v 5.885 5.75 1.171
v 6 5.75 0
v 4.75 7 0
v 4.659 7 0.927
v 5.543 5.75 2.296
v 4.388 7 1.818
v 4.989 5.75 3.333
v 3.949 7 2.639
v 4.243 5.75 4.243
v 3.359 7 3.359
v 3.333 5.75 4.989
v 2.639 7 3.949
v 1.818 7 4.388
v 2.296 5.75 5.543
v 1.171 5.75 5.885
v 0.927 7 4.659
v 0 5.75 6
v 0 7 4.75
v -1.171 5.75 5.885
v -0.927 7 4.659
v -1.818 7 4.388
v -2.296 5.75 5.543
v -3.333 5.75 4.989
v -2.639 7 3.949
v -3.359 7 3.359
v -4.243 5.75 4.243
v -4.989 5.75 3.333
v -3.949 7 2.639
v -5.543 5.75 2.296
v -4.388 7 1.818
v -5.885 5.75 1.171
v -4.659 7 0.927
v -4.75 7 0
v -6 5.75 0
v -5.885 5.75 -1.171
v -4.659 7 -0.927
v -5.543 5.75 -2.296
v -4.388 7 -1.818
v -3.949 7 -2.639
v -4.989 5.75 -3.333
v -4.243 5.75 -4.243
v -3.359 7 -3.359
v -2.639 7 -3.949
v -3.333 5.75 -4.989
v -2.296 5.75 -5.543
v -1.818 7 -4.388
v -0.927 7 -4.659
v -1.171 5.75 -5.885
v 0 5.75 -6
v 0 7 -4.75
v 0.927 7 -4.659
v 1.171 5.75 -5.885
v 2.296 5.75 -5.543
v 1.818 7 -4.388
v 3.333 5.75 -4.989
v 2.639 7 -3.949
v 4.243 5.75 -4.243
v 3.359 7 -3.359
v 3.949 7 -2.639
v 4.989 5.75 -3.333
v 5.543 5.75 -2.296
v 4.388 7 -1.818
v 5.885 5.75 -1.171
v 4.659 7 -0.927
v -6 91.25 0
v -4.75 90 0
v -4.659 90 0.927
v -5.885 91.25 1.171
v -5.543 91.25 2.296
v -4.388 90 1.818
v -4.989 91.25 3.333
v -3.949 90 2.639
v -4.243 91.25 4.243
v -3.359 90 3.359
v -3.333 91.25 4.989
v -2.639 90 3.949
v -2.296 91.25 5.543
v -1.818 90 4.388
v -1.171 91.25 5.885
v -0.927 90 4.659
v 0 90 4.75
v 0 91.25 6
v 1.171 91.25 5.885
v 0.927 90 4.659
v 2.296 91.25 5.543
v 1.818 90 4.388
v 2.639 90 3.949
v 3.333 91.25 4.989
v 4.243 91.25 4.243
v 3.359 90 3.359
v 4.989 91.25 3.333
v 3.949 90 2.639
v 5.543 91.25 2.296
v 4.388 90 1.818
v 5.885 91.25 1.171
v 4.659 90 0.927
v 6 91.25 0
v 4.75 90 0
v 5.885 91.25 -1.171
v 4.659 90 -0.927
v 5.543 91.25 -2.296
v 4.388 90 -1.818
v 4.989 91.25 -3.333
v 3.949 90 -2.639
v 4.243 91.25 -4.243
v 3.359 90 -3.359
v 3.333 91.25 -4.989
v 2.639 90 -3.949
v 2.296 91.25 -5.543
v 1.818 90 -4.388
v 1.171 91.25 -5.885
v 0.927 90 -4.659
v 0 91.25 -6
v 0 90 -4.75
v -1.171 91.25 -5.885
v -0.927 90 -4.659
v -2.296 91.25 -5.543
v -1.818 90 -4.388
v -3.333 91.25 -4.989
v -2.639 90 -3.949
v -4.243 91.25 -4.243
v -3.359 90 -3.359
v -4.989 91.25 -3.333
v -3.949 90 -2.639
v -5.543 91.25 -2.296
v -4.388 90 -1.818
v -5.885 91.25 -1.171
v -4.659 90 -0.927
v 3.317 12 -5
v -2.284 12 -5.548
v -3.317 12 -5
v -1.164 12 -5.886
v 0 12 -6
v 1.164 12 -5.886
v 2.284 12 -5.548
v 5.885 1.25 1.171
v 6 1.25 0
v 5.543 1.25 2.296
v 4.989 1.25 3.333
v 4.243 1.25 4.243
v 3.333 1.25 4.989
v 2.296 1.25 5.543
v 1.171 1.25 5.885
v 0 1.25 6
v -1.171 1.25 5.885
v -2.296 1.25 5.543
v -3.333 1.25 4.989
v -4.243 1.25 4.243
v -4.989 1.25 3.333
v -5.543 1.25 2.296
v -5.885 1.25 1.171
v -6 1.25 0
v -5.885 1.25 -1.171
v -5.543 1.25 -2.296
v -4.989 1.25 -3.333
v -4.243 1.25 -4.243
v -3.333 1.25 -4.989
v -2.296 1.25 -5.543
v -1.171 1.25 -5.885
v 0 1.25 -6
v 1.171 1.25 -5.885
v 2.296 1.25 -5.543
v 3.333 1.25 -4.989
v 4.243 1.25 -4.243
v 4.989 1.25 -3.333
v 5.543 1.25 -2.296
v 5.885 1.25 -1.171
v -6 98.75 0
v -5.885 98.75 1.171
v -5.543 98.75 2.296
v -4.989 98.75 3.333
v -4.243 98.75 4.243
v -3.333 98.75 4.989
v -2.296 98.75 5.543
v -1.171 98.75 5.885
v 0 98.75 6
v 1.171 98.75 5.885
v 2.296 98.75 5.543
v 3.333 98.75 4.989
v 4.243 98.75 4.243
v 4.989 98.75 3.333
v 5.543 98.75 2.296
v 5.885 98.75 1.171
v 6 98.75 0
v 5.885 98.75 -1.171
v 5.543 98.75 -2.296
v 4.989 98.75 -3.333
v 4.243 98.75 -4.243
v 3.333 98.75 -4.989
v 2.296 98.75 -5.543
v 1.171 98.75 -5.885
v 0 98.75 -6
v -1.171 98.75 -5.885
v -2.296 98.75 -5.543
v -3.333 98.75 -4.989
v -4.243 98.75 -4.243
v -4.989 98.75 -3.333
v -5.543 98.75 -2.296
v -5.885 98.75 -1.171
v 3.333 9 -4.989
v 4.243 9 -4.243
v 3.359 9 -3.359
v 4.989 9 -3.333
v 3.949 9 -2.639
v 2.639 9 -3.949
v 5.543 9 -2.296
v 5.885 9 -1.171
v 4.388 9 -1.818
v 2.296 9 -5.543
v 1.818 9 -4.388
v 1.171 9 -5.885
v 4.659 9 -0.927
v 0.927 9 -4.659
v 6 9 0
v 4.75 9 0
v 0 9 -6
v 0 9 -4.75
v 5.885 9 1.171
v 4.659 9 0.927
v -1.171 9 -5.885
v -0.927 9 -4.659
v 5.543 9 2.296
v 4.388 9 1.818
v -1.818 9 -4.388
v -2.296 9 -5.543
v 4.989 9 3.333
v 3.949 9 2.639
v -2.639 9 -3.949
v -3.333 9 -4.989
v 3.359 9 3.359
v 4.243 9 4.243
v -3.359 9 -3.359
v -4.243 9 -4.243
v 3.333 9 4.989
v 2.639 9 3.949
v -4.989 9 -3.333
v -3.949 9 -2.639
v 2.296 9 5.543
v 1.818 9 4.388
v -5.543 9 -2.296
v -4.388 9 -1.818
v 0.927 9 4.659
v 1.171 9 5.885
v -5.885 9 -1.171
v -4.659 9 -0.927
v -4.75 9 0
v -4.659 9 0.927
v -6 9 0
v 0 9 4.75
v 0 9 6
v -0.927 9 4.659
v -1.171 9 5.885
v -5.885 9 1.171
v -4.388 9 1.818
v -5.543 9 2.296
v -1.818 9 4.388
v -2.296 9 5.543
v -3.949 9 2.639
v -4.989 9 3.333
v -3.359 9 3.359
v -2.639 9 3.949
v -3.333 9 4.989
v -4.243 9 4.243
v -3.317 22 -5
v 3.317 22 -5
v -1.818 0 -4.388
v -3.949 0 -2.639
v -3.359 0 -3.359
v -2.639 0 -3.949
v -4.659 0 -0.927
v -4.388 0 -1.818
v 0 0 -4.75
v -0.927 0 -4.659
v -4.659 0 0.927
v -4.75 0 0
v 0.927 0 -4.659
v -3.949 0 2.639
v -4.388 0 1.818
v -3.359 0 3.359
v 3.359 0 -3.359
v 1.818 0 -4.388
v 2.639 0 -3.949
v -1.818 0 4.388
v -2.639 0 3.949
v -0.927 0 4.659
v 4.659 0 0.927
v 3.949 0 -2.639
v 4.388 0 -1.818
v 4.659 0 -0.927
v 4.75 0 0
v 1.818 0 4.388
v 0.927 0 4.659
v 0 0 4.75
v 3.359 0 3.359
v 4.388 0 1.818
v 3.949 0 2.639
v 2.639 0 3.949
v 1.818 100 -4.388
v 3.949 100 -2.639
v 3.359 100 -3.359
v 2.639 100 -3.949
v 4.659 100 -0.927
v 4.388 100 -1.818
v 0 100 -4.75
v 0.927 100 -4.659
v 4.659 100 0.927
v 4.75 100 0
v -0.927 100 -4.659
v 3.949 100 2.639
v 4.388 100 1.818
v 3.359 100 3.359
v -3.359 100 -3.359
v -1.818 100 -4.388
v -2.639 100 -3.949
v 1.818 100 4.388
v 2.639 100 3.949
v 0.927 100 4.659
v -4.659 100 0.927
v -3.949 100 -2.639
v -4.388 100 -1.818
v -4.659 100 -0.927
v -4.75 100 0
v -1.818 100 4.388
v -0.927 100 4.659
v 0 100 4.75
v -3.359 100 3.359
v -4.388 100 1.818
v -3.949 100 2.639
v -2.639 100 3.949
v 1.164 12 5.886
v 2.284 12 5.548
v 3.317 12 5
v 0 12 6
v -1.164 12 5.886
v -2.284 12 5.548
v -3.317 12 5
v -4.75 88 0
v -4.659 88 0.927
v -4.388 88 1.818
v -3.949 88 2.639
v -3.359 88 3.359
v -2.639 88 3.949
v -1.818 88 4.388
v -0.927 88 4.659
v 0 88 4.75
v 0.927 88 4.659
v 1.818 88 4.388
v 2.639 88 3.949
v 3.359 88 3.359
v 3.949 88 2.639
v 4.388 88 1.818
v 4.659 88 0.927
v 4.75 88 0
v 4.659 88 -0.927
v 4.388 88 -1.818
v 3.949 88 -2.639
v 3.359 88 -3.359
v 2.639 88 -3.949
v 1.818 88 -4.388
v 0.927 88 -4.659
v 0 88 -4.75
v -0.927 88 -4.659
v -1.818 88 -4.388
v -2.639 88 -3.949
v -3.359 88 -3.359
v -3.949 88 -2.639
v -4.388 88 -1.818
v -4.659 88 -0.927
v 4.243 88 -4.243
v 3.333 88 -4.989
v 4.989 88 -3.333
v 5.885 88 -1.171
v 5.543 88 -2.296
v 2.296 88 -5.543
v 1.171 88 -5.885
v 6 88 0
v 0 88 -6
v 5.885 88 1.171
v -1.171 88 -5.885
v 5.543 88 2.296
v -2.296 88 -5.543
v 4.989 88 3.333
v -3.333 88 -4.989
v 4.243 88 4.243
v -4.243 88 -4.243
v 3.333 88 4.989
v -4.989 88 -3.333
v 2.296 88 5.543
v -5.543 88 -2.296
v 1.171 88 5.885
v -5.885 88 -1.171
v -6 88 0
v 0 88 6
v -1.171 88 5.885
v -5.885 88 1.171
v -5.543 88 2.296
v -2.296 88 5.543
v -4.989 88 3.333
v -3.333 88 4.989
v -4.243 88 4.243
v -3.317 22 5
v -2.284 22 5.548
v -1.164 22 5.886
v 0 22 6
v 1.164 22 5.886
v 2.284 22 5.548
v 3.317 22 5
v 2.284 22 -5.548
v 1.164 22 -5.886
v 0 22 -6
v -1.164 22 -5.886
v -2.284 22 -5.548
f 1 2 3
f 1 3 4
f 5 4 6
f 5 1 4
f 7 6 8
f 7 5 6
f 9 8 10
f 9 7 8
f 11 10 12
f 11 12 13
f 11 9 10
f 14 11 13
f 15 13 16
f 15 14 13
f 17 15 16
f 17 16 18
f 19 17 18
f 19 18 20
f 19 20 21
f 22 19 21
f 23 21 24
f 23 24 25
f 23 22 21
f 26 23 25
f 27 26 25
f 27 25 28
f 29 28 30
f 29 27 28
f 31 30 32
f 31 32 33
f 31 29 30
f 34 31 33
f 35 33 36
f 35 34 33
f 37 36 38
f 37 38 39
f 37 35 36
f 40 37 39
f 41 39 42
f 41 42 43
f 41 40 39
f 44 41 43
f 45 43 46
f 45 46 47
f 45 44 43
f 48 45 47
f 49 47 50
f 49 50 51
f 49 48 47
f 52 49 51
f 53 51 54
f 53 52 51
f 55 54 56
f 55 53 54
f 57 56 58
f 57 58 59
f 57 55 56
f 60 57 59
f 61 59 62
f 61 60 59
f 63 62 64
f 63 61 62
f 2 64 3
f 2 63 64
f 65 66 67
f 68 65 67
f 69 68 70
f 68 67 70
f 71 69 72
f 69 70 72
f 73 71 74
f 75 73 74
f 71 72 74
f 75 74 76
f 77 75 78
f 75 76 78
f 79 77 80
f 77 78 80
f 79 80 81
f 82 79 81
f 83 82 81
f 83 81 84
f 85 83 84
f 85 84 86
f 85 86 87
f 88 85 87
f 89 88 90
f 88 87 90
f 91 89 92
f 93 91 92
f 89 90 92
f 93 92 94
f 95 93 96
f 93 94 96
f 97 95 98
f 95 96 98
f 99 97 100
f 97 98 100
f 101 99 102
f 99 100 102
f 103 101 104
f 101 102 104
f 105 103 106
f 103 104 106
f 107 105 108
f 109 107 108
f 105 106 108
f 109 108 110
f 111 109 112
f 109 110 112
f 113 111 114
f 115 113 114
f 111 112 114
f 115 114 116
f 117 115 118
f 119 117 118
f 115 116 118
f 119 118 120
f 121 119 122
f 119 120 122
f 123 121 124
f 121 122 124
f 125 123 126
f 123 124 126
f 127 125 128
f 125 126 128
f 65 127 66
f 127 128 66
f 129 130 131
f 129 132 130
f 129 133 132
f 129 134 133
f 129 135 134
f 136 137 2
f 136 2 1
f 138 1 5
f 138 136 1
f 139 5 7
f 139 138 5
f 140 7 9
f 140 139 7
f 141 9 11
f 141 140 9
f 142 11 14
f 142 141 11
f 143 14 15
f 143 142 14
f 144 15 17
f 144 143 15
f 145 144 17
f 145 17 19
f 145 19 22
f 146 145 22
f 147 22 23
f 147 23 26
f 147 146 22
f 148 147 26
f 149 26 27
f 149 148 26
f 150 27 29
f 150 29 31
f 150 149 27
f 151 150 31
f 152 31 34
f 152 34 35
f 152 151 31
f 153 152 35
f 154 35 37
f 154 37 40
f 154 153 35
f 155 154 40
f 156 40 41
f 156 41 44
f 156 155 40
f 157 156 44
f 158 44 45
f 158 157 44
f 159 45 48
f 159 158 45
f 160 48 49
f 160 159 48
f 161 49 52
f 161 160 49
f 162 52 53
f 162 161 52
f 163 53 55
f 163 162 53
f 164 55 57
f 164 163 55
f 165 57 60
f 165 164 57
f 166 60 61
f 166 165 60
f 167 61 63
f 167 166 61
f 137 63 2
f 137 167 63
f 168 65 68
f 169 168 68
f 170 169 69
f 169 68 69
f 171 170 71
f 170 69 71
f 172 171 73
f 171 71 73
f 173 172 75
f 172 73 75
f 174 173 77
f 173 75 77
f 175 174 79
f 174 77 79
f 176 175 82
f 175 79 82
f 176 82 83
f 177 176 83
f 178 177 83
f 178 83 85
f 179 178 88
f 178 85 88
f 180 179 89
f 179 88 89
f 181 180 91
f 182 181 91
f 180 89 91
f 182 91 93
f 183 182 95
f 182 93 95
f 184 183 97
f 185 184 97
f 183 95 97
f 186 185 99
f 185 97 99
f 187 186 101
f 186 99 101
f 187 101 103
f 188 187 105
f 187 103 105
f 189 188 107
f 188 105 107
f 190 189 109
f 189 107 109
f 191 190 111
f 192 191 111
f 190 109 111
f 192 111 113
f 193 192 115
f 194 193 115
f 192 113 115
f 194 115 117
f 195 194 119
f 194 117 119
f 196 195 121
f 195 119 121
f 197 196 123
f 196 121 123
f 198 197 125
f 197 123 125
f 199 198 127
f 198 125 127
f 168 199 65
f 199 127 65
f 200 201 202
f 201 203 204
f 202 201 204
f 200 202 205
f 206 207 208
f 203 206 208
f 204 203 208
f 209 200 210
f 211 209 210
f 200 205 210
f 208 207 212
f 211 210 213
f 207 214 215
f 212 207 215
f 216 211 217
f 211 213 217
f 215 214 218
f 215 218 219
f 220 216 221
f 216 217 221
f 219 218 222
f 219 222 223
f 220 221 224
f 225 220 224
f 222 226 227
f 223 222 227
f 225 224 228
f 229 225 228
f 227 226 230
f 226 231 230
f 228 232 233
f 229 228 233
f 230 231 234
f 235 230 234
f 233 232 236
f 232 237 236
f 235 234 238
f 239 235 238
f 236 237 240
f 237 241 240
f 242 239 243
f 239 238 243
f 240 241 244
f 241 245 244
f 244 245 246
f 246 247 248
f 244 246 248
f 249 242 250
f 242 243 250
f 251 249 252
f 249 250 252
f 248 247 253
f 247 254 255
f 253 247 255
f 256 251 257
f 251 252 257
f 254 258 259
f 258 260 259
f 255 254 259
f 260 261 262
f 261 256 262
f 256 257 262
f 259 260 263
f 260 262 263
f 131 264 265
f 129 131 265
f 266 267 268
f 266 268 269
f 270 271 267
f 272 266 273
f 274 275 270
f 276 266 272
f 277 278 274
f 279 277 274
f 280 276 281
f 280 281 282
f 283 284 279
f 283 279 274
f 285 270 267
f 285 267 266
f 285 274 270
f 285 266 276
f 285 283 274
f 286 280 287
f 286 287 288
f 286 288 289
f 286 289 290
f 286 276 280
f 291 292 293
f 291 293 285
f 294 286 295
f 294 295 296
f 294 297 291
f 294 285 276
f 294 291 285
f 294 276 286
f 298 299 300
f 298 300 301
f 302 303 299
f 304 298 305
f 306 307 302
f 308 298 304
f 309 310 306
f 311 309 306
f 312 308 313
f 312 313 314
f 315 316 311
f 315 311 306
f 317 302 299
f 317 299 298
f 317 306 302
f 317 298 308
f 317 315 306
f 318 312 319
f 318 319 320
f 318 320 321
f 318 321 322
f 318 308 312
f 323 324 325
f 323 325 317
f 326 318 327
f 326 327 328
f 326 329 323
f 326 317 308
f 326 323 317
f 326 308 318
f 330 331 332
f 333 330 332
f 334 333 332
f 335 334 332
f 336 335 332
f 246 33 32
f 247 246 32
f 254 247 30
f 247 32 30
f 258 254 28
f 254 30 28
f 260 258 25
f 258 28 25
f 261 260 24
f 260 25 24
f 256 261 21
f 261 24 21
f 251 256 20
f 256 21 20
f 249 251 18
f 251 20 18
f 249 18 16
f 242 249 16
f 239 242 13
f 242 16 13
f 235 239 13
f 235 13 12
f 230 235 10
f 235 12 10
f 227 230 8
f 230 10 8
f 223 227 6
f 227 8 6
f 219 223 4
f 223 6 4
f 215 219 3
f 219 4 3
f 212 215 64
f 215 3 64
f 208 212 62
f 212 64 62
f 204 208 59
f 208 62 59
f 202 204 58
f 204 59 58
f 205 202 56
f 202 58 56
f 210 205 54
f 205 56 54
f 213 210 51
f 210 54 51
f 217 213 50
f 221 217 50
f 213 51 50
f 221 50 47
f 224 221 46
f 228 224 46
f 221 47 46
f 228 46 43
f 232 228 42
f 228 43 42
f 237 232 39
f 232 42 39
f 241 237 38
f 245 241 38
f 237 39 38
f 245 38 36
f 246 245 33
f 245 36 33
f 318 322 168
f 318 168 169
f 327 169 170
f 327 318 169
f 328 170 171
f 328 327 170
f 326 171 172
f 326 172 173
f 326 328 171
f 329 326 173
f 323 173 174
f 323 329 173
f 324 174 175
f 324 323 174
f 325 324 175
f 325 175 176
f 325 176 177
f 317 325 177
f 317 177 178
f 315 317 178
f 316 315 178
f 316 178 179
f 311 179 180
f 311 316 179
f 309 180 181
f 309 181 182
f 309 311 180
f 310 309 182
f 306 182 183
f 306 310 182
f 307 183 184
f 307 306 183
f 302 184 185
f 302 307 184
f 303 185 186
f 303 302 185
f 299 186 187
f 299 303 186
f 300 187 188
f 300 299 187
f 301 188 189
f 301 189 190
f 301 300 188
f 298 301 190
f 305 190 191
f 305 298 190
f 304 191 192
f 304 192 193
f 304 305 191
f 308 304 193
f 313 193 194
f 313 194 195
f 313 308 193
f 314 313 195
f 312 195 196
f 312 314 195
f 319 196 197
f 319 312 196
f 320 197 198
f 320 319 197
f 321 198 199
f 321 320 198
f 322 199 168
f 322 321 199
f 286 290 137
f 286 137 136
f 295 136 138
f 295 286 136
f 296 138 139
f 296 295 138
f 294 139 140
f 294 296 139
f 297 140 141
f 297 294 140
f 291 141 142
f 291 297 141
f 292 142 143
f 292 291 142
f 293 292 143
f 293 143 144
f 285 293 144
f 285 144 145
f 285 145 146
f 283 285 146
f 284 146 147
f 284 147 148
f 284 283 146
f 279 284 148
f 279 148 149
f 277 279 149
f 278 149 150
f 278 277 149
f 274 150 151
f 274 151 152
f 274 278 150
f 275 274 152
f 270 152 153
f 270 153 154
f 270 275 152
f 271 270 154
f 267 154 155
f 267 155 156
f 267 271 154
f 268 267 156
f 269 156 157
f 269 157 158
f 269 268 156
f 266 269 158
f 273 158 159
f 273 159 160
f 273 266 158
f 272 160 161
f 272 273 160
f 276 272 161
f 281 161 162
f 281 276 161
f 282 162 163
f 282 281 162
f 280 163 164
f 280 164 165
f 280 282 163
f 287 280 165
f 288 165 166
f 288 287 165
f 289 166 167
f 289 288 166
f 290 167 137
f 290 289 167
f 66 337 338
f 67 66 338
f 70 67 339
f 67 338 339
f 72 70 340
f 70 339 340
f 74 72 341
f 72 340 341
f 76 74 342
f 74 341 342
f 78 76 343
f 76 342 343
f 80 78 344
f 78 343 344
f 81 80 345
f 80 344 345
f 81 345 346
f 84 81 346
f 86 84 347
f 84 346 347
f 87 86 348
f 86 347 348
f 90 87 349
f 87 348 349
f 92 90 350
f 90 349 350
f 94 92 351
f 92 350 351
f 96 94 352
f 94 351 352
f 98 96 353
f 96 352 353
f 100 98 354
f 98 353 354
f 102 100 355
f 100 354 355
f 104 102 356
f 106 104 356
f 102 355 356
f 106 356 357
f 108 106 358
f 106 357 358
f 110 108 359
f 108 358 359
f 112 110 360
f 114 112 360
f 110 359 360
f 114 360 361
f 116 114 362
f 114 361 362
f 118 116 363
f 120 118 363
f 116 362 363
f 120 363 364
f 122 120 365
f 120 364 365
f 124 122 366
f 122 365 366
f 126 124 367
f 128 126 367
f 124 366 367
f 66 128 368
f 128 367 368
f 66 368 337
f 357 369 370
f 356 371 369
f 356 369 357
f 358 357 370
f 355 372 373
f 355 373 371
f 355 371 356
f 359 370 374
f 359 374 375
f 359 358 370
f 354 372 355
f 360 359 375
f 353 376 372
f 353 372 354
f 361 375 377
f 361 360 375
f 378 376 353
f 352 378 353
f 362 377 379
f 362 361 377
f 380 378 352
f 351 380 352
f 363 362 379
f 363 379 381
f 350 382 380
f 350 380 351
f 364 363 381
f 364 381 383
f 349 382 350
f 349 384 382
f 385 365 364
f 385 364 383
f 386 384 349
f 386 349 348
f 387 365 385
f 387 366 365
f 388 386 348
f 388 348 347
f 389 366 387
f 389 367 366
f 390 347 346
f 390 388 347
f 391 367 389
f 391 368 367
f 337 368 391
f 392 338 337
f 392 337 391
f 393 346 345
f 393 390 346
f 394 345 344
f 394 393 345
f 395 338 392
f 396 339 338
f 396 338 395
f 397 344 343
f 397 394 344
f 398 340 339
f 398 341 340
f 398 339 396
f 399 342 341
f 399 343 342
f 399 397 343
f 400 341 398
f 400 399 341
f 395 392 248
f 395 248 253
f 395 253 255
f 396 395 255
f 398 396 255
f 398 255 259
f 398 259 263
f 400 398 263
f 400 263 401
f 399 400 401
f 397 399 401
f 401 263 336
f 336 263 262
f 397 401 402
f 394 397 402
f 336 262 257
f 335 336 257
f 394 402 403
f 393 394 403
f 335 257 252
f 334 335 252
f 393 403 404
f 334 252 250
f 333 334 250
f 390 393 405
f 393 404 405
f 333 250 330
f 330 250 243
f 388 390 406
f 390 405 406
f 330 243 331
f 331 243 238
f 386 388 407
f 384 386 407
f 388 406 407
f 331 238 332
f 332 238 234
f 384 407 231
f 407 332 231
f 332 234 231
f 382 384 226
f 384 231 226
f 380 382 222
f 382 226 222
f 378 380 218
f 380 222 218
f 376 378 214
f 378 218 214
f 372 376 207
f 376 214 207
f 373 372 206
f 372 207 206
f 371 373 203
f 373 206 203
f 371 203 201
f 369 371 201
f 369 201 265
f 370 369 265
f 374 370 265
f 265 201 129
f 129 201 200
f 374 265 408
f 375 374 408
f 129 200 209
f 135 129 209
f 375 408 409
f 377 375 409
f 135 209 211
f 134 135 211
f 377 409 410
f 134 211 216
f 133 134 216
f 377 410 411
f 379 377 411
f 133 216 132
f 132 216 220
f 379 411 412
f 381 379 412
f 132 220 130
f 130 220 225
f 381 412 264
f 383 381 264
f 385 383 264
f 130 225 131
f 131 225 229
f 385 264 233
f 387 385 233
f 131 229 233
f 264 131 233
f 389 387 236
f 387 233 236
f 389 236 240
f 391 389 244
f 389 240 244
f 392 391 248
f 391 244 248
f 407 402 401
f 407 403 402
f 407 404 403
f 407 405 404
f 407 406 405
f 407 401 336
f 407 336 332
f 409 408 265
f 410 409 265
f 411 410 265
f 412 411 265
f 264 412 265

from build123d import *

# Parameters (mm, degrees)
F0_R      = 6
F1_DEPTH  = 7
F2_R      = 4.75
F3_DEPTH  = 2
F4_R      = 6
F5_DEPTH  = 79
F6_R      = 4.75
F7_DEPTH  = 2
F8_R      = 6
F9_DEPTH  = 10
F10_SIZE  = 1.24999
F12_W     = 13
F12_H     = 10
F13_DEPTH = 1


# Not quite as in the source:
# - a fillet or chamfer is up to 0.001 mm smaller than in the source, because OpenCascade refuses the exact size


with BuildPart() as f1:
    # F0 (on Front) → F1 (new body)
    with BuildSketch(Plane.XZ):
        Circle(F0_R)
    extrude(amount=-F1_DEPTH)

    # F2 (on face) → F3 (join)
    with BuildSketch(Plane(origin=(0, 7, 0), x_dir=(-1, 0, 0), z_dir=(0, 1, 0))):
        Circle(F2_R)
    extrude(amount=F3_DEPTH)

    # F4 (on face) → F5 (join)
    with BuildSketch(Plane(origin=(0, 9, 0), x_dir=(-1, 0, 0), z_dir=(0, 1, 0))):
        Circle(F4_R)
    extrude(amount=F5_DEPTH)

    # F6 (on face) → F7 (join)
    with BuildSketch(Plane(origin=(0, 88, 0), x_dir=(-1, 0, 0), z_dir=(0, 1, 0))):
        Circle(F6_R)
    extrude(amount=F7_DEPTH)

    # F8 (on face) → F9 (join)
    with BuildSketch(Plane(origin=(0, 90, 0), x_dir=(-1, 0, 0), z_dir=(0, 1, 0))):
        Circle(F8_R)
    extrude(amount=F9_DEPTH)

    # F10 (size 1.25 in the source; OpenCascade refuses exactly that, so slightly less here)
    f10_edges = [f1.edges().sort_by_distance(p)[0] for p in [
        (6, 3.5, 0),
        (-6, 0, 0),
        (-6, 7, 0),
        (-6, 95, 0),
        (6, 90, 0),
        (6, 100, 0),
    ]]
    chamfer(f10_edges, length=F10_SIZE)

    # F12 (on offset) → F13 (cut)
    with BuildSketch(Plane.XY.offset(6)):
        with Locations((0, 17)):
            Rectangle(F12_W, F12_H)
    f13 = extrude(amount=-F13_DEPTH, mode=Mode.SUBTRACT)

    # F14: F13 across plane
    add(f13.mirror(Plane.XY), mode=Mode.SUBTRACT)


solid = f1.part
